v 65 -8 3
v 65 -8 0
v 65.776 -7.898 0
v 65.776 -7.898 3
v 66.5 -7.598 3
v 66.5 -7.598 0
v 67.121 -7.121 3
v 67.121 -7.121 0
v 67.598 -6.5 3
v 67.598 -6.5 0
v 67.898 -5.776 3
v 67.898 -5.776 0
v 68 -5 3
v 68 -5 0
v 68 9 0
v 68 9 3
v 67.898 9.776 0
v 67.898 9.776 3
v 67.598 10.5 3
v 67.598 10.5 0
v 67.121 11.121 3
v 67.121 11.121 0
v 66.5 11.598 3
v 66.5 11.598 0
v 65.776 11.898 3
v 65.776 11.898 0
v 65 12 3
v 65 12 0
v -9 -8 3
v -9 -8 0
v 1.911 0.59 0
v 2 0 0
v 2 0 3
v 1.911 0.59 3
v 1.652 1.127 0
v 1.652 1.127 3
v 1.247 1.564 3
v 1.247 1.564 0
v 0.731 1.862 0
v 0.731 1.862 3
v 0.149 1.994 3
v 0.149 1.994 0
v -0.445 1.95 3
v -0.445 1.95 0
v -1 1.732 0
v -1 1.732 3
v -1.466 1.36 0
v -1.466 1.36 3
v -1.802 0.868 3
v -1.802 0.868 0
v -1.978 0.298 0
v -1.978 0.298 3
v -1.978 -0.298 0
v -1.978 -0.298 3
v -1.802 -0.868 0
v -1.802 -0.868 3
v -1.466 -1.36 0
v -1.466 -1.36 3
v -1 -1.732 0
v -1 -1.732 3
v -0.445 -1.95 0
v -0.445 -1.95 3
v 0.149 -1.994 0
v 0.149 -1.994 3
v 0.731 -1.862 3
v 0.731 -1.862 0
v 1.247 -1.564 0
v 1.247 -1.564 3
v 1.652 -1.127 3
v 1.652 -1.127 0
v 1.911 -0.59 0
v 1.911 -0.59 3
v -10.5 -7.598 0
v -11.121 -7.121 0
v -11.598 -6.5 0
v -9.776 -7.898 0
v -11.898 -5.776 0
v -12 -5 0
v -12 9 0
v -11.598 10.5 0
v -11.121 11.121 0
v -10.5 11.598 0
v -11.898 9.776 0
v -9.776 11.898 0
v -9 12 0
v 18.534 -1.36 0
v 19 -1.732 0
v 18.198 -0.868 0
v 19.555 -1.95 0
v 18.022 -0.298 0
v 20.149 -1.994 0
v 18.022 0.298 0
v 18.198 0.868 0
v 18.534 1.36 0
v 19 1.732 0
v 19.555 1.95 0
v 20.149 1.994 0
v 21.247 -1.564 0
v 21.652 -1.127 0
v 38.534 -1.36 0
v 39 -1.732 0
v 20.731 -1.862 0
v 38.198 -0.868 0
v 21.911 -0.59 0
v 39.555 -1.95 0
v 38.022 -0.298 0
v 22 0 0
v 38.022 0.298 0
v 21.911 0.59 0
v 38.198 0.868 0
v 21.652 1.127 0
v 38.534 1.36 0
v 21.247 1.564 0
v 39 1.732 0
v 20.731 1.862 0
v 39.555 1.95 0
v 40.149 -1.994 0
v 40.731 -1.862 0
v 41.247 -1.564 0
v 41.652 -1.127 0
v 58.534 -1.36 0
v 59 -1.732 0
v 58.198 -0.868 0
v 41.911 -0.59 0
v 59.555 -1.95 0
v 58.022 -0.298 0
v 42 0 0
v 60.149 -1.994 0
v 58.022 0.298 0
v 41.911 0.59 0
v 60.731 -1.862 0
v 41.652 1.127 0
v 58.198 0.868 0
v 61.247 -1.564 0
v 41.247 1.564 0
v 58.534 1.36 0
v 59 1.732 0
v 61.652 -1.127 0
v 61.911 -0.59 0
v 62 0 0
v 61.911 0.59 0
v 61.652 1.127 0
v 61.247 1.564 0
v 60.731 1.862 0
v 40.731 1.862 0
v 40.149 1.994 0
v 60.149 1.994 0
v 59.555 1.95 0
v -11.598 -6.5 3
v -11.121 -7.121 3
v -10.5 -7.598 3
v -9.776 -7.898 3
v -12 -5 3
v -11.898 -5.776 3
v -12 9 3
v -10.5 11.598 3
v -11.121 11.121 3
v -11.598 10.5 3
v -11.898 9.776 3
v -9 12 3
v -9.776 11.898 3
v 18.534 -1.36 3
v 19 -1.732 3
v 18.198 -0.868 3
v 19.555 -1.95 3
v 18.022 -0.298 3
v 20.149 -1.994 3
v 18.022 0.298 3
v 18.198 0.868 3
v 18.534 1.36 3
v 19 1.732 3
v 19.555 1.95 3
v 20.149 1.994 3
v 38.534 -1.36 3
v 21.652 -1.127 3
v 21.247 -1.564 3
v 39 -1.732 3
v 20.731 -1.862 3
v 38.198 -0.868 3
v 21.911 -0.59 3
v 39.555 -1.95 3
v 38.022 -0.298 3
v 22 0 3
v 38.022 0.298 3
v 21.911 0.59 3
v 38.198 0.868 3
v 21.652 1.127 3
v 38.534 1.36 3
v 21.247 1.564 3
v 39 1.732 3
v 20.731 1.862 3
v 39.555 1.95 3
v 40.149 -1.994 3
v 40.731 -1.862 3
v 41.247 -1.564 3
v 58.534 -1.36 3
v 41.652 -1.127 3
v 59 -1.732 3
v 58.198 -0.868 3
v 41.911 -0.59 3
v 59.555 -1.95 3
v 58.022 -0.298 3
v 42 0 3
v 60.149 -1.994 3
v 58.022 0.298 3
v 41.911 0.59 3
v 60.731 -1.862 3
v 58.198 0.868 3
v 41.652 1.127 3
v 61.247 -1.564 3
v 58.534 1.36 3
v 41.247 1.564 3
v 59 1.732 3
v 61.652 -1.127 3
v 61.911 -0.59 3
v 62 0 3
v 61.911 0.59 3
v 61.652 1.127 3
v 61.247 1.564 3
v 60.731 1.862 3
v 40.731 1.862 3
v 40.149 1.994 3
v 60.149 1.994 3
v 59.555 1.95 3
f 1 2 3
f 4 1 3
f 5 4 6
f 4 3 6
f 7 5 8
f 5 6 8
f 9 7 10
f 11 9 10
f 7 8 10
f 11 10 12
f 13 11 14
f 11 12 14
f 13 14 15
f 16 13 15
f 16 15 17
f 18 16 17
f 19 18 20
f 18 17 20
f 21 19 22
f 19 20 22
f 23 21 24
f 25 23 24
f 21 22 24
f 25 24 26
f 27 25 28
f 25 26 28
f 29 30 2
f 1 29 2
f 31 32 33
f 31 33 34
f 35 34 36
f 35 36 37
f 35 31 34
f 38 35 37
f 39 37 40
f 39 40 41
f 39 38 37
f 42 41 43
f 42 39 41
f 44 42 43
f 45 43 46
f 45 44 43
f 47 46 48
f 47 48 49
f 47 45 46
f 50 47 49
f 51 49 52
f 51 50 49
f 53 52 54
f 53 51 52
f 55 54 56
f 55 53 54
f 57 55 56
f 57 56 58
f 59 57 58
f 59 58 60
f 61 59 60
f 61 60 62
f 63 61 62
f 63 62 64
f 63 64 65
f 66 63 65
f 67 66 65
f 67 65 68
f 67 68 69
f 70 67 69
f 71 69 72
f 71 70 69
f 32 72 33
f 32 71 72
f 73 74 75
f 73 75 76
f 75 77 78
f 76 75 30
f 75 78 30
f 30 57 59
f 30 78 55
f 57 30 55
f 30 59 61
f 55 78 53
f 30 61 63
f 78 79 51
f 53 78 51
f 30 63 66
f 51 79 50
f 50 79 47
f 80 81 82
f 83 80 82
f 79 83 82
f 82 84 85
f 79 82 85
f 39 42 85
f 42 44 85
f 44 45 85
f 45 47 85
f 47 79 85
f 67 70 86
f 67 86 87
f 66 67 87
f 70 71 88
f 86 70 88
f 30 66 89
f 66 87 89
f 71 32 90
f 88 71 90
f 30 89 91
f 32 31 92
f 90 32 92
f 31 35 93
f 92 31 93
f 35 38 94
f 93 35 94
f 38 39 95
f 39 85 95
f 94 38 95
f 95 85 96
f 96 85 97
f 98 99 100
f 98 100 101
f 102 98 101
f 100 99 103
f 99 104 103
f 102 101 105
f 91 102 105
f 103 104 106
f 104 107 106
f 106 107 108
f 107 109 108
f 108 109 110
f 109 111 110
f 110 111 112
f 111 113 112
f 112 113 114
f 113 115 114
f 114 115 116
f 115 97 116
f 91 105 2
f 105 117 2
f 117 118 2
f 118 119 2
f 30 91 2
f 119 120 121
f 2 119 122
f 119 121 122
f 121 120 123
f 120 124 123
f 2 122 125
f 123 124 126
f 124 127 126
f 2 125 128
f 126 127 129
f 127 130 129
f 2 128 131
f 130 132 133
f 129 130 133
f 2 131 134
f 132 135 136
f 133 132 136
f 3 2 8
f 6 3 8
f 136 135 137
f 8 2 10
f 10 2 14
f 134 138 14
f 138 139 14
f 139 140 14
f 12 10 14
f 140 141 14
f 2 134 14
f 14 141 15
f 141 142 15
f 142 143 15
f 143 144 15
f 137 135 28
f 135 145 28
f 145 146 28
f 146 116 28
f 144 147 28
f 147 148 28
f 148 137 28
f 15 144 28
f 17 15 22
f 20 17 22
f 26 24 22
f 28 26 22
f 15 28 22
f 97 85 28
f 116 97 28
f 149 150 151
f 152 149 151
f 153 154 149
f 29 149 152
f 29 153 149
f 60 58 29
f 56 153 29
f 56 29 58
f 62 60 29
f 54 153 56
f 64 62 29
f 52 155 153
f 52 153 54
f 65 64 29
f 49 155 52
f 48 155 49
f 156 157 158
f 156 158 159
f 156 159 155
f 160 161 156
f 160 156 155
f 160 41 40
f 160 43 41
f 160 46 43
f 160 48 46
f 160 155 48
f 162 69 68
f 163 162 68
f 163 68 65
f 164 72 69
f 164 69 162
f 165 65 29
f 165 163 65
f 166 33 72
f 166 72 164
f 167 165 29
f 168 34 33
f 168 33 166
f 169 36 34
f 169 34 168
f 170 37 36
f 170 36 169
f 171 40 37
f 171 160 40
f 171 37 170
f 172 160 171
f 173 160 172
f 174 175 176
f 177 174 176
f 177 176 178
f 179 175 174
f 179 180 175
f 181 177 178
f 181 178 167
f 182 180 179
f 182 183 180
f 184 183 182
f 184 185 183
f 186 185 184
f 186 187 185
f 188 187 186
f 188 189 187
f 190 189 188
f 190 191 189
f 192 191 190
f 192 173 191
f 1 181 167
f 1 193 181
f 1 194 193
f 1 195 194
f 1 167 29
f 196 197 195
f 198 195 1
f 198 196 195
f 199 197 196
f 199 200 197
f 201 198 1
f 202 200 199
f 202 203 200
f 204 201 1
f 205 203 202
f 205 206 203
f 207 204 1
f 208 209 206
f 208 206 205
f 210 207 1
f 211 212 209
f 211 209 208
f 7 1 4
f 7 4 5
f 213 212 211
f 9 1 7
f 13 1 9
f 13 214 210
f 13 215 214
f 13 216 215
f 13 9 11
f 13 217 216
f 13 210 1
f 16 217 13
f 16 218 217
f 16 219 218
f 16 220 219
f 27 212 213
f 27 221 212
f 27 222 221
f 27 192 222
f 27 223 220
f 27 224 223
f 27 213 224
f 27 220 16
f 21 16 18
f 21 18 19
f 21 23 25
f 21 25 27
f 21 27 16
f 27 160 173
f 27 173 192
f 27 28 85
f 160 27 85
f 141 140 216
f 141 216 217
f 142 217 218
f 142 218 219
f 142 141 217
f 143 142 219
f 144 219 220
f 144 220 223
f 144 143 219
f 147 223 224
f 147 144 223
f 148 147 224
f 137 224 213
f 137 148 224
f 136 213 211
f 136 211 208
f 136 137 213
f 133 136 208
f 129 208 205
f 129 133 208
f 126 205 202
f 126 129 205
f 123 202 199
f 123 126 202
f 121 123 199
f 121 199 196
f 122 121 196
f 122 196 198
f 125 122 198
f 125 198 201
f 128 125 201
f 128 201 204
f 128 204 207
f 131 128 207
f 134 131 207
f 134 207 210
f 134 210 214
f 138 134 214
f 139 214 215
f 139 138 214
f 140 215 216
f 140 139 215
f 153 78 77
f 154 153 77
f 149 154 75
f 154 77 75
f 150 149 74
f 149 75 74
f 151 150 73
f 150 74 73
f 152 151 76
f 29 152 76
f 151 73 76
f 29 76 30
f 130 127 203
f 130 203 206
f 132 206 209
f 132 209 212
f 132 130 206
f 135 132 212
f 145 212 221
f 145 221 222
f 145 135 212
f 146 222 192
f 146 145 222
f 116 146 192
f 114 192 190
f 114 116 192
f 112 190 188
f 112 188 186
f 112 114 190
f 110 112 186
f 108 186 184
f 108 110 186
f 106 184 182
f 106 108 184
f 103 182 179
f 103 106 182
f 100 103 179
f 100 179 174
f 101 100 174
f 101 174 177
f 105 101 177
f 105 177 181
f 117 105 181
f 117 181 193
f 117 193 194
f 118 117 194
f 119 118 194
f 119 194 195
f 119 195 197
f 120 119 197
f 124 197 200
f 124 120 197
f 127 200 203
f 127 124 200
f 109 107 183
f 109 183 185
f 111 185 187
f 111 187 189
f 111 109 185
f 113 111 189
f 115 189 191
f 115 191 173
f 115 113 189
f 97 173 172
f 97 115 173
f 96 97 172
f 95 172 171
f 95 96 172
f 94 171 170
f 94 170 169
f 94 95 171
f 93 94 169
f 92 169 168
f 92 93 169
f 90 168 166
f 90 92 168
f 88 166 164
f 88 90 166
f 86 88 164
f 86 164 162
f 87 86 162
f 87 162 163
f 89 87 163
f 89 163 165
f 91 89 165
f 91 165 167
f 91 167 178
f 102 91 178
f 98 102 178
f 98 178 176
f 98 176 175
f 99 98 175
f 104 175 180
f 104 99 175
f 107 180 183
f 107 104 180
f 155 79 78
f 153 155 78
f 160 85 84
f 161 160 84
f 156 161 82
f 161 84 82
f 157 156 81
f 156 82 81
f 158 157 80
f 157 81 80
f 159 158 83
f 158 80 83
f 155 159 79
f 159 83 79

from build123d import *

# Parameters (mm, degrees)
F0_R     = 2
F1_DEPTH = 3


with BuildPart() as f1:
    # F0 (on Top) → F1 (new body)
    with BuildSketch(Plane.XY):
        with BuildLine():
            ThreePointArc((68, 9), (67.12132, 11.12132), (65, 12))
            Line((65, 12), (-9, 12))
            ThreePointArc((-9, 12), (-11.12132, 11.12132), (-12, 9))
            Line((-12, 9), (-12, -5))
            ThreePointArc((-12, -5), (-11.12132, -7.12132), (-9, -8))
            Line((-9, -8), (65, -8))
            ThreePointArc((65, -8), (67.12132, -7.12132), (68, -5))
            Line((68, -5), (68, 9))
        make_face()
        Circle(F0_R, mode=Mode.SUBTRACT)
        with Locations((20, 0)):
            Circle(F0_R, mode=Mode.SUBTRACT)
        with Locations((40, 0)):
            Circle(F0_R, mode=Mode.SUBTRACT)
        with Locations((60, 0)):
            Circle(F0_R, mode=Mode.SUBTRACT)
    extrude(amount=F1_DEPTH)


solid = f1.part
